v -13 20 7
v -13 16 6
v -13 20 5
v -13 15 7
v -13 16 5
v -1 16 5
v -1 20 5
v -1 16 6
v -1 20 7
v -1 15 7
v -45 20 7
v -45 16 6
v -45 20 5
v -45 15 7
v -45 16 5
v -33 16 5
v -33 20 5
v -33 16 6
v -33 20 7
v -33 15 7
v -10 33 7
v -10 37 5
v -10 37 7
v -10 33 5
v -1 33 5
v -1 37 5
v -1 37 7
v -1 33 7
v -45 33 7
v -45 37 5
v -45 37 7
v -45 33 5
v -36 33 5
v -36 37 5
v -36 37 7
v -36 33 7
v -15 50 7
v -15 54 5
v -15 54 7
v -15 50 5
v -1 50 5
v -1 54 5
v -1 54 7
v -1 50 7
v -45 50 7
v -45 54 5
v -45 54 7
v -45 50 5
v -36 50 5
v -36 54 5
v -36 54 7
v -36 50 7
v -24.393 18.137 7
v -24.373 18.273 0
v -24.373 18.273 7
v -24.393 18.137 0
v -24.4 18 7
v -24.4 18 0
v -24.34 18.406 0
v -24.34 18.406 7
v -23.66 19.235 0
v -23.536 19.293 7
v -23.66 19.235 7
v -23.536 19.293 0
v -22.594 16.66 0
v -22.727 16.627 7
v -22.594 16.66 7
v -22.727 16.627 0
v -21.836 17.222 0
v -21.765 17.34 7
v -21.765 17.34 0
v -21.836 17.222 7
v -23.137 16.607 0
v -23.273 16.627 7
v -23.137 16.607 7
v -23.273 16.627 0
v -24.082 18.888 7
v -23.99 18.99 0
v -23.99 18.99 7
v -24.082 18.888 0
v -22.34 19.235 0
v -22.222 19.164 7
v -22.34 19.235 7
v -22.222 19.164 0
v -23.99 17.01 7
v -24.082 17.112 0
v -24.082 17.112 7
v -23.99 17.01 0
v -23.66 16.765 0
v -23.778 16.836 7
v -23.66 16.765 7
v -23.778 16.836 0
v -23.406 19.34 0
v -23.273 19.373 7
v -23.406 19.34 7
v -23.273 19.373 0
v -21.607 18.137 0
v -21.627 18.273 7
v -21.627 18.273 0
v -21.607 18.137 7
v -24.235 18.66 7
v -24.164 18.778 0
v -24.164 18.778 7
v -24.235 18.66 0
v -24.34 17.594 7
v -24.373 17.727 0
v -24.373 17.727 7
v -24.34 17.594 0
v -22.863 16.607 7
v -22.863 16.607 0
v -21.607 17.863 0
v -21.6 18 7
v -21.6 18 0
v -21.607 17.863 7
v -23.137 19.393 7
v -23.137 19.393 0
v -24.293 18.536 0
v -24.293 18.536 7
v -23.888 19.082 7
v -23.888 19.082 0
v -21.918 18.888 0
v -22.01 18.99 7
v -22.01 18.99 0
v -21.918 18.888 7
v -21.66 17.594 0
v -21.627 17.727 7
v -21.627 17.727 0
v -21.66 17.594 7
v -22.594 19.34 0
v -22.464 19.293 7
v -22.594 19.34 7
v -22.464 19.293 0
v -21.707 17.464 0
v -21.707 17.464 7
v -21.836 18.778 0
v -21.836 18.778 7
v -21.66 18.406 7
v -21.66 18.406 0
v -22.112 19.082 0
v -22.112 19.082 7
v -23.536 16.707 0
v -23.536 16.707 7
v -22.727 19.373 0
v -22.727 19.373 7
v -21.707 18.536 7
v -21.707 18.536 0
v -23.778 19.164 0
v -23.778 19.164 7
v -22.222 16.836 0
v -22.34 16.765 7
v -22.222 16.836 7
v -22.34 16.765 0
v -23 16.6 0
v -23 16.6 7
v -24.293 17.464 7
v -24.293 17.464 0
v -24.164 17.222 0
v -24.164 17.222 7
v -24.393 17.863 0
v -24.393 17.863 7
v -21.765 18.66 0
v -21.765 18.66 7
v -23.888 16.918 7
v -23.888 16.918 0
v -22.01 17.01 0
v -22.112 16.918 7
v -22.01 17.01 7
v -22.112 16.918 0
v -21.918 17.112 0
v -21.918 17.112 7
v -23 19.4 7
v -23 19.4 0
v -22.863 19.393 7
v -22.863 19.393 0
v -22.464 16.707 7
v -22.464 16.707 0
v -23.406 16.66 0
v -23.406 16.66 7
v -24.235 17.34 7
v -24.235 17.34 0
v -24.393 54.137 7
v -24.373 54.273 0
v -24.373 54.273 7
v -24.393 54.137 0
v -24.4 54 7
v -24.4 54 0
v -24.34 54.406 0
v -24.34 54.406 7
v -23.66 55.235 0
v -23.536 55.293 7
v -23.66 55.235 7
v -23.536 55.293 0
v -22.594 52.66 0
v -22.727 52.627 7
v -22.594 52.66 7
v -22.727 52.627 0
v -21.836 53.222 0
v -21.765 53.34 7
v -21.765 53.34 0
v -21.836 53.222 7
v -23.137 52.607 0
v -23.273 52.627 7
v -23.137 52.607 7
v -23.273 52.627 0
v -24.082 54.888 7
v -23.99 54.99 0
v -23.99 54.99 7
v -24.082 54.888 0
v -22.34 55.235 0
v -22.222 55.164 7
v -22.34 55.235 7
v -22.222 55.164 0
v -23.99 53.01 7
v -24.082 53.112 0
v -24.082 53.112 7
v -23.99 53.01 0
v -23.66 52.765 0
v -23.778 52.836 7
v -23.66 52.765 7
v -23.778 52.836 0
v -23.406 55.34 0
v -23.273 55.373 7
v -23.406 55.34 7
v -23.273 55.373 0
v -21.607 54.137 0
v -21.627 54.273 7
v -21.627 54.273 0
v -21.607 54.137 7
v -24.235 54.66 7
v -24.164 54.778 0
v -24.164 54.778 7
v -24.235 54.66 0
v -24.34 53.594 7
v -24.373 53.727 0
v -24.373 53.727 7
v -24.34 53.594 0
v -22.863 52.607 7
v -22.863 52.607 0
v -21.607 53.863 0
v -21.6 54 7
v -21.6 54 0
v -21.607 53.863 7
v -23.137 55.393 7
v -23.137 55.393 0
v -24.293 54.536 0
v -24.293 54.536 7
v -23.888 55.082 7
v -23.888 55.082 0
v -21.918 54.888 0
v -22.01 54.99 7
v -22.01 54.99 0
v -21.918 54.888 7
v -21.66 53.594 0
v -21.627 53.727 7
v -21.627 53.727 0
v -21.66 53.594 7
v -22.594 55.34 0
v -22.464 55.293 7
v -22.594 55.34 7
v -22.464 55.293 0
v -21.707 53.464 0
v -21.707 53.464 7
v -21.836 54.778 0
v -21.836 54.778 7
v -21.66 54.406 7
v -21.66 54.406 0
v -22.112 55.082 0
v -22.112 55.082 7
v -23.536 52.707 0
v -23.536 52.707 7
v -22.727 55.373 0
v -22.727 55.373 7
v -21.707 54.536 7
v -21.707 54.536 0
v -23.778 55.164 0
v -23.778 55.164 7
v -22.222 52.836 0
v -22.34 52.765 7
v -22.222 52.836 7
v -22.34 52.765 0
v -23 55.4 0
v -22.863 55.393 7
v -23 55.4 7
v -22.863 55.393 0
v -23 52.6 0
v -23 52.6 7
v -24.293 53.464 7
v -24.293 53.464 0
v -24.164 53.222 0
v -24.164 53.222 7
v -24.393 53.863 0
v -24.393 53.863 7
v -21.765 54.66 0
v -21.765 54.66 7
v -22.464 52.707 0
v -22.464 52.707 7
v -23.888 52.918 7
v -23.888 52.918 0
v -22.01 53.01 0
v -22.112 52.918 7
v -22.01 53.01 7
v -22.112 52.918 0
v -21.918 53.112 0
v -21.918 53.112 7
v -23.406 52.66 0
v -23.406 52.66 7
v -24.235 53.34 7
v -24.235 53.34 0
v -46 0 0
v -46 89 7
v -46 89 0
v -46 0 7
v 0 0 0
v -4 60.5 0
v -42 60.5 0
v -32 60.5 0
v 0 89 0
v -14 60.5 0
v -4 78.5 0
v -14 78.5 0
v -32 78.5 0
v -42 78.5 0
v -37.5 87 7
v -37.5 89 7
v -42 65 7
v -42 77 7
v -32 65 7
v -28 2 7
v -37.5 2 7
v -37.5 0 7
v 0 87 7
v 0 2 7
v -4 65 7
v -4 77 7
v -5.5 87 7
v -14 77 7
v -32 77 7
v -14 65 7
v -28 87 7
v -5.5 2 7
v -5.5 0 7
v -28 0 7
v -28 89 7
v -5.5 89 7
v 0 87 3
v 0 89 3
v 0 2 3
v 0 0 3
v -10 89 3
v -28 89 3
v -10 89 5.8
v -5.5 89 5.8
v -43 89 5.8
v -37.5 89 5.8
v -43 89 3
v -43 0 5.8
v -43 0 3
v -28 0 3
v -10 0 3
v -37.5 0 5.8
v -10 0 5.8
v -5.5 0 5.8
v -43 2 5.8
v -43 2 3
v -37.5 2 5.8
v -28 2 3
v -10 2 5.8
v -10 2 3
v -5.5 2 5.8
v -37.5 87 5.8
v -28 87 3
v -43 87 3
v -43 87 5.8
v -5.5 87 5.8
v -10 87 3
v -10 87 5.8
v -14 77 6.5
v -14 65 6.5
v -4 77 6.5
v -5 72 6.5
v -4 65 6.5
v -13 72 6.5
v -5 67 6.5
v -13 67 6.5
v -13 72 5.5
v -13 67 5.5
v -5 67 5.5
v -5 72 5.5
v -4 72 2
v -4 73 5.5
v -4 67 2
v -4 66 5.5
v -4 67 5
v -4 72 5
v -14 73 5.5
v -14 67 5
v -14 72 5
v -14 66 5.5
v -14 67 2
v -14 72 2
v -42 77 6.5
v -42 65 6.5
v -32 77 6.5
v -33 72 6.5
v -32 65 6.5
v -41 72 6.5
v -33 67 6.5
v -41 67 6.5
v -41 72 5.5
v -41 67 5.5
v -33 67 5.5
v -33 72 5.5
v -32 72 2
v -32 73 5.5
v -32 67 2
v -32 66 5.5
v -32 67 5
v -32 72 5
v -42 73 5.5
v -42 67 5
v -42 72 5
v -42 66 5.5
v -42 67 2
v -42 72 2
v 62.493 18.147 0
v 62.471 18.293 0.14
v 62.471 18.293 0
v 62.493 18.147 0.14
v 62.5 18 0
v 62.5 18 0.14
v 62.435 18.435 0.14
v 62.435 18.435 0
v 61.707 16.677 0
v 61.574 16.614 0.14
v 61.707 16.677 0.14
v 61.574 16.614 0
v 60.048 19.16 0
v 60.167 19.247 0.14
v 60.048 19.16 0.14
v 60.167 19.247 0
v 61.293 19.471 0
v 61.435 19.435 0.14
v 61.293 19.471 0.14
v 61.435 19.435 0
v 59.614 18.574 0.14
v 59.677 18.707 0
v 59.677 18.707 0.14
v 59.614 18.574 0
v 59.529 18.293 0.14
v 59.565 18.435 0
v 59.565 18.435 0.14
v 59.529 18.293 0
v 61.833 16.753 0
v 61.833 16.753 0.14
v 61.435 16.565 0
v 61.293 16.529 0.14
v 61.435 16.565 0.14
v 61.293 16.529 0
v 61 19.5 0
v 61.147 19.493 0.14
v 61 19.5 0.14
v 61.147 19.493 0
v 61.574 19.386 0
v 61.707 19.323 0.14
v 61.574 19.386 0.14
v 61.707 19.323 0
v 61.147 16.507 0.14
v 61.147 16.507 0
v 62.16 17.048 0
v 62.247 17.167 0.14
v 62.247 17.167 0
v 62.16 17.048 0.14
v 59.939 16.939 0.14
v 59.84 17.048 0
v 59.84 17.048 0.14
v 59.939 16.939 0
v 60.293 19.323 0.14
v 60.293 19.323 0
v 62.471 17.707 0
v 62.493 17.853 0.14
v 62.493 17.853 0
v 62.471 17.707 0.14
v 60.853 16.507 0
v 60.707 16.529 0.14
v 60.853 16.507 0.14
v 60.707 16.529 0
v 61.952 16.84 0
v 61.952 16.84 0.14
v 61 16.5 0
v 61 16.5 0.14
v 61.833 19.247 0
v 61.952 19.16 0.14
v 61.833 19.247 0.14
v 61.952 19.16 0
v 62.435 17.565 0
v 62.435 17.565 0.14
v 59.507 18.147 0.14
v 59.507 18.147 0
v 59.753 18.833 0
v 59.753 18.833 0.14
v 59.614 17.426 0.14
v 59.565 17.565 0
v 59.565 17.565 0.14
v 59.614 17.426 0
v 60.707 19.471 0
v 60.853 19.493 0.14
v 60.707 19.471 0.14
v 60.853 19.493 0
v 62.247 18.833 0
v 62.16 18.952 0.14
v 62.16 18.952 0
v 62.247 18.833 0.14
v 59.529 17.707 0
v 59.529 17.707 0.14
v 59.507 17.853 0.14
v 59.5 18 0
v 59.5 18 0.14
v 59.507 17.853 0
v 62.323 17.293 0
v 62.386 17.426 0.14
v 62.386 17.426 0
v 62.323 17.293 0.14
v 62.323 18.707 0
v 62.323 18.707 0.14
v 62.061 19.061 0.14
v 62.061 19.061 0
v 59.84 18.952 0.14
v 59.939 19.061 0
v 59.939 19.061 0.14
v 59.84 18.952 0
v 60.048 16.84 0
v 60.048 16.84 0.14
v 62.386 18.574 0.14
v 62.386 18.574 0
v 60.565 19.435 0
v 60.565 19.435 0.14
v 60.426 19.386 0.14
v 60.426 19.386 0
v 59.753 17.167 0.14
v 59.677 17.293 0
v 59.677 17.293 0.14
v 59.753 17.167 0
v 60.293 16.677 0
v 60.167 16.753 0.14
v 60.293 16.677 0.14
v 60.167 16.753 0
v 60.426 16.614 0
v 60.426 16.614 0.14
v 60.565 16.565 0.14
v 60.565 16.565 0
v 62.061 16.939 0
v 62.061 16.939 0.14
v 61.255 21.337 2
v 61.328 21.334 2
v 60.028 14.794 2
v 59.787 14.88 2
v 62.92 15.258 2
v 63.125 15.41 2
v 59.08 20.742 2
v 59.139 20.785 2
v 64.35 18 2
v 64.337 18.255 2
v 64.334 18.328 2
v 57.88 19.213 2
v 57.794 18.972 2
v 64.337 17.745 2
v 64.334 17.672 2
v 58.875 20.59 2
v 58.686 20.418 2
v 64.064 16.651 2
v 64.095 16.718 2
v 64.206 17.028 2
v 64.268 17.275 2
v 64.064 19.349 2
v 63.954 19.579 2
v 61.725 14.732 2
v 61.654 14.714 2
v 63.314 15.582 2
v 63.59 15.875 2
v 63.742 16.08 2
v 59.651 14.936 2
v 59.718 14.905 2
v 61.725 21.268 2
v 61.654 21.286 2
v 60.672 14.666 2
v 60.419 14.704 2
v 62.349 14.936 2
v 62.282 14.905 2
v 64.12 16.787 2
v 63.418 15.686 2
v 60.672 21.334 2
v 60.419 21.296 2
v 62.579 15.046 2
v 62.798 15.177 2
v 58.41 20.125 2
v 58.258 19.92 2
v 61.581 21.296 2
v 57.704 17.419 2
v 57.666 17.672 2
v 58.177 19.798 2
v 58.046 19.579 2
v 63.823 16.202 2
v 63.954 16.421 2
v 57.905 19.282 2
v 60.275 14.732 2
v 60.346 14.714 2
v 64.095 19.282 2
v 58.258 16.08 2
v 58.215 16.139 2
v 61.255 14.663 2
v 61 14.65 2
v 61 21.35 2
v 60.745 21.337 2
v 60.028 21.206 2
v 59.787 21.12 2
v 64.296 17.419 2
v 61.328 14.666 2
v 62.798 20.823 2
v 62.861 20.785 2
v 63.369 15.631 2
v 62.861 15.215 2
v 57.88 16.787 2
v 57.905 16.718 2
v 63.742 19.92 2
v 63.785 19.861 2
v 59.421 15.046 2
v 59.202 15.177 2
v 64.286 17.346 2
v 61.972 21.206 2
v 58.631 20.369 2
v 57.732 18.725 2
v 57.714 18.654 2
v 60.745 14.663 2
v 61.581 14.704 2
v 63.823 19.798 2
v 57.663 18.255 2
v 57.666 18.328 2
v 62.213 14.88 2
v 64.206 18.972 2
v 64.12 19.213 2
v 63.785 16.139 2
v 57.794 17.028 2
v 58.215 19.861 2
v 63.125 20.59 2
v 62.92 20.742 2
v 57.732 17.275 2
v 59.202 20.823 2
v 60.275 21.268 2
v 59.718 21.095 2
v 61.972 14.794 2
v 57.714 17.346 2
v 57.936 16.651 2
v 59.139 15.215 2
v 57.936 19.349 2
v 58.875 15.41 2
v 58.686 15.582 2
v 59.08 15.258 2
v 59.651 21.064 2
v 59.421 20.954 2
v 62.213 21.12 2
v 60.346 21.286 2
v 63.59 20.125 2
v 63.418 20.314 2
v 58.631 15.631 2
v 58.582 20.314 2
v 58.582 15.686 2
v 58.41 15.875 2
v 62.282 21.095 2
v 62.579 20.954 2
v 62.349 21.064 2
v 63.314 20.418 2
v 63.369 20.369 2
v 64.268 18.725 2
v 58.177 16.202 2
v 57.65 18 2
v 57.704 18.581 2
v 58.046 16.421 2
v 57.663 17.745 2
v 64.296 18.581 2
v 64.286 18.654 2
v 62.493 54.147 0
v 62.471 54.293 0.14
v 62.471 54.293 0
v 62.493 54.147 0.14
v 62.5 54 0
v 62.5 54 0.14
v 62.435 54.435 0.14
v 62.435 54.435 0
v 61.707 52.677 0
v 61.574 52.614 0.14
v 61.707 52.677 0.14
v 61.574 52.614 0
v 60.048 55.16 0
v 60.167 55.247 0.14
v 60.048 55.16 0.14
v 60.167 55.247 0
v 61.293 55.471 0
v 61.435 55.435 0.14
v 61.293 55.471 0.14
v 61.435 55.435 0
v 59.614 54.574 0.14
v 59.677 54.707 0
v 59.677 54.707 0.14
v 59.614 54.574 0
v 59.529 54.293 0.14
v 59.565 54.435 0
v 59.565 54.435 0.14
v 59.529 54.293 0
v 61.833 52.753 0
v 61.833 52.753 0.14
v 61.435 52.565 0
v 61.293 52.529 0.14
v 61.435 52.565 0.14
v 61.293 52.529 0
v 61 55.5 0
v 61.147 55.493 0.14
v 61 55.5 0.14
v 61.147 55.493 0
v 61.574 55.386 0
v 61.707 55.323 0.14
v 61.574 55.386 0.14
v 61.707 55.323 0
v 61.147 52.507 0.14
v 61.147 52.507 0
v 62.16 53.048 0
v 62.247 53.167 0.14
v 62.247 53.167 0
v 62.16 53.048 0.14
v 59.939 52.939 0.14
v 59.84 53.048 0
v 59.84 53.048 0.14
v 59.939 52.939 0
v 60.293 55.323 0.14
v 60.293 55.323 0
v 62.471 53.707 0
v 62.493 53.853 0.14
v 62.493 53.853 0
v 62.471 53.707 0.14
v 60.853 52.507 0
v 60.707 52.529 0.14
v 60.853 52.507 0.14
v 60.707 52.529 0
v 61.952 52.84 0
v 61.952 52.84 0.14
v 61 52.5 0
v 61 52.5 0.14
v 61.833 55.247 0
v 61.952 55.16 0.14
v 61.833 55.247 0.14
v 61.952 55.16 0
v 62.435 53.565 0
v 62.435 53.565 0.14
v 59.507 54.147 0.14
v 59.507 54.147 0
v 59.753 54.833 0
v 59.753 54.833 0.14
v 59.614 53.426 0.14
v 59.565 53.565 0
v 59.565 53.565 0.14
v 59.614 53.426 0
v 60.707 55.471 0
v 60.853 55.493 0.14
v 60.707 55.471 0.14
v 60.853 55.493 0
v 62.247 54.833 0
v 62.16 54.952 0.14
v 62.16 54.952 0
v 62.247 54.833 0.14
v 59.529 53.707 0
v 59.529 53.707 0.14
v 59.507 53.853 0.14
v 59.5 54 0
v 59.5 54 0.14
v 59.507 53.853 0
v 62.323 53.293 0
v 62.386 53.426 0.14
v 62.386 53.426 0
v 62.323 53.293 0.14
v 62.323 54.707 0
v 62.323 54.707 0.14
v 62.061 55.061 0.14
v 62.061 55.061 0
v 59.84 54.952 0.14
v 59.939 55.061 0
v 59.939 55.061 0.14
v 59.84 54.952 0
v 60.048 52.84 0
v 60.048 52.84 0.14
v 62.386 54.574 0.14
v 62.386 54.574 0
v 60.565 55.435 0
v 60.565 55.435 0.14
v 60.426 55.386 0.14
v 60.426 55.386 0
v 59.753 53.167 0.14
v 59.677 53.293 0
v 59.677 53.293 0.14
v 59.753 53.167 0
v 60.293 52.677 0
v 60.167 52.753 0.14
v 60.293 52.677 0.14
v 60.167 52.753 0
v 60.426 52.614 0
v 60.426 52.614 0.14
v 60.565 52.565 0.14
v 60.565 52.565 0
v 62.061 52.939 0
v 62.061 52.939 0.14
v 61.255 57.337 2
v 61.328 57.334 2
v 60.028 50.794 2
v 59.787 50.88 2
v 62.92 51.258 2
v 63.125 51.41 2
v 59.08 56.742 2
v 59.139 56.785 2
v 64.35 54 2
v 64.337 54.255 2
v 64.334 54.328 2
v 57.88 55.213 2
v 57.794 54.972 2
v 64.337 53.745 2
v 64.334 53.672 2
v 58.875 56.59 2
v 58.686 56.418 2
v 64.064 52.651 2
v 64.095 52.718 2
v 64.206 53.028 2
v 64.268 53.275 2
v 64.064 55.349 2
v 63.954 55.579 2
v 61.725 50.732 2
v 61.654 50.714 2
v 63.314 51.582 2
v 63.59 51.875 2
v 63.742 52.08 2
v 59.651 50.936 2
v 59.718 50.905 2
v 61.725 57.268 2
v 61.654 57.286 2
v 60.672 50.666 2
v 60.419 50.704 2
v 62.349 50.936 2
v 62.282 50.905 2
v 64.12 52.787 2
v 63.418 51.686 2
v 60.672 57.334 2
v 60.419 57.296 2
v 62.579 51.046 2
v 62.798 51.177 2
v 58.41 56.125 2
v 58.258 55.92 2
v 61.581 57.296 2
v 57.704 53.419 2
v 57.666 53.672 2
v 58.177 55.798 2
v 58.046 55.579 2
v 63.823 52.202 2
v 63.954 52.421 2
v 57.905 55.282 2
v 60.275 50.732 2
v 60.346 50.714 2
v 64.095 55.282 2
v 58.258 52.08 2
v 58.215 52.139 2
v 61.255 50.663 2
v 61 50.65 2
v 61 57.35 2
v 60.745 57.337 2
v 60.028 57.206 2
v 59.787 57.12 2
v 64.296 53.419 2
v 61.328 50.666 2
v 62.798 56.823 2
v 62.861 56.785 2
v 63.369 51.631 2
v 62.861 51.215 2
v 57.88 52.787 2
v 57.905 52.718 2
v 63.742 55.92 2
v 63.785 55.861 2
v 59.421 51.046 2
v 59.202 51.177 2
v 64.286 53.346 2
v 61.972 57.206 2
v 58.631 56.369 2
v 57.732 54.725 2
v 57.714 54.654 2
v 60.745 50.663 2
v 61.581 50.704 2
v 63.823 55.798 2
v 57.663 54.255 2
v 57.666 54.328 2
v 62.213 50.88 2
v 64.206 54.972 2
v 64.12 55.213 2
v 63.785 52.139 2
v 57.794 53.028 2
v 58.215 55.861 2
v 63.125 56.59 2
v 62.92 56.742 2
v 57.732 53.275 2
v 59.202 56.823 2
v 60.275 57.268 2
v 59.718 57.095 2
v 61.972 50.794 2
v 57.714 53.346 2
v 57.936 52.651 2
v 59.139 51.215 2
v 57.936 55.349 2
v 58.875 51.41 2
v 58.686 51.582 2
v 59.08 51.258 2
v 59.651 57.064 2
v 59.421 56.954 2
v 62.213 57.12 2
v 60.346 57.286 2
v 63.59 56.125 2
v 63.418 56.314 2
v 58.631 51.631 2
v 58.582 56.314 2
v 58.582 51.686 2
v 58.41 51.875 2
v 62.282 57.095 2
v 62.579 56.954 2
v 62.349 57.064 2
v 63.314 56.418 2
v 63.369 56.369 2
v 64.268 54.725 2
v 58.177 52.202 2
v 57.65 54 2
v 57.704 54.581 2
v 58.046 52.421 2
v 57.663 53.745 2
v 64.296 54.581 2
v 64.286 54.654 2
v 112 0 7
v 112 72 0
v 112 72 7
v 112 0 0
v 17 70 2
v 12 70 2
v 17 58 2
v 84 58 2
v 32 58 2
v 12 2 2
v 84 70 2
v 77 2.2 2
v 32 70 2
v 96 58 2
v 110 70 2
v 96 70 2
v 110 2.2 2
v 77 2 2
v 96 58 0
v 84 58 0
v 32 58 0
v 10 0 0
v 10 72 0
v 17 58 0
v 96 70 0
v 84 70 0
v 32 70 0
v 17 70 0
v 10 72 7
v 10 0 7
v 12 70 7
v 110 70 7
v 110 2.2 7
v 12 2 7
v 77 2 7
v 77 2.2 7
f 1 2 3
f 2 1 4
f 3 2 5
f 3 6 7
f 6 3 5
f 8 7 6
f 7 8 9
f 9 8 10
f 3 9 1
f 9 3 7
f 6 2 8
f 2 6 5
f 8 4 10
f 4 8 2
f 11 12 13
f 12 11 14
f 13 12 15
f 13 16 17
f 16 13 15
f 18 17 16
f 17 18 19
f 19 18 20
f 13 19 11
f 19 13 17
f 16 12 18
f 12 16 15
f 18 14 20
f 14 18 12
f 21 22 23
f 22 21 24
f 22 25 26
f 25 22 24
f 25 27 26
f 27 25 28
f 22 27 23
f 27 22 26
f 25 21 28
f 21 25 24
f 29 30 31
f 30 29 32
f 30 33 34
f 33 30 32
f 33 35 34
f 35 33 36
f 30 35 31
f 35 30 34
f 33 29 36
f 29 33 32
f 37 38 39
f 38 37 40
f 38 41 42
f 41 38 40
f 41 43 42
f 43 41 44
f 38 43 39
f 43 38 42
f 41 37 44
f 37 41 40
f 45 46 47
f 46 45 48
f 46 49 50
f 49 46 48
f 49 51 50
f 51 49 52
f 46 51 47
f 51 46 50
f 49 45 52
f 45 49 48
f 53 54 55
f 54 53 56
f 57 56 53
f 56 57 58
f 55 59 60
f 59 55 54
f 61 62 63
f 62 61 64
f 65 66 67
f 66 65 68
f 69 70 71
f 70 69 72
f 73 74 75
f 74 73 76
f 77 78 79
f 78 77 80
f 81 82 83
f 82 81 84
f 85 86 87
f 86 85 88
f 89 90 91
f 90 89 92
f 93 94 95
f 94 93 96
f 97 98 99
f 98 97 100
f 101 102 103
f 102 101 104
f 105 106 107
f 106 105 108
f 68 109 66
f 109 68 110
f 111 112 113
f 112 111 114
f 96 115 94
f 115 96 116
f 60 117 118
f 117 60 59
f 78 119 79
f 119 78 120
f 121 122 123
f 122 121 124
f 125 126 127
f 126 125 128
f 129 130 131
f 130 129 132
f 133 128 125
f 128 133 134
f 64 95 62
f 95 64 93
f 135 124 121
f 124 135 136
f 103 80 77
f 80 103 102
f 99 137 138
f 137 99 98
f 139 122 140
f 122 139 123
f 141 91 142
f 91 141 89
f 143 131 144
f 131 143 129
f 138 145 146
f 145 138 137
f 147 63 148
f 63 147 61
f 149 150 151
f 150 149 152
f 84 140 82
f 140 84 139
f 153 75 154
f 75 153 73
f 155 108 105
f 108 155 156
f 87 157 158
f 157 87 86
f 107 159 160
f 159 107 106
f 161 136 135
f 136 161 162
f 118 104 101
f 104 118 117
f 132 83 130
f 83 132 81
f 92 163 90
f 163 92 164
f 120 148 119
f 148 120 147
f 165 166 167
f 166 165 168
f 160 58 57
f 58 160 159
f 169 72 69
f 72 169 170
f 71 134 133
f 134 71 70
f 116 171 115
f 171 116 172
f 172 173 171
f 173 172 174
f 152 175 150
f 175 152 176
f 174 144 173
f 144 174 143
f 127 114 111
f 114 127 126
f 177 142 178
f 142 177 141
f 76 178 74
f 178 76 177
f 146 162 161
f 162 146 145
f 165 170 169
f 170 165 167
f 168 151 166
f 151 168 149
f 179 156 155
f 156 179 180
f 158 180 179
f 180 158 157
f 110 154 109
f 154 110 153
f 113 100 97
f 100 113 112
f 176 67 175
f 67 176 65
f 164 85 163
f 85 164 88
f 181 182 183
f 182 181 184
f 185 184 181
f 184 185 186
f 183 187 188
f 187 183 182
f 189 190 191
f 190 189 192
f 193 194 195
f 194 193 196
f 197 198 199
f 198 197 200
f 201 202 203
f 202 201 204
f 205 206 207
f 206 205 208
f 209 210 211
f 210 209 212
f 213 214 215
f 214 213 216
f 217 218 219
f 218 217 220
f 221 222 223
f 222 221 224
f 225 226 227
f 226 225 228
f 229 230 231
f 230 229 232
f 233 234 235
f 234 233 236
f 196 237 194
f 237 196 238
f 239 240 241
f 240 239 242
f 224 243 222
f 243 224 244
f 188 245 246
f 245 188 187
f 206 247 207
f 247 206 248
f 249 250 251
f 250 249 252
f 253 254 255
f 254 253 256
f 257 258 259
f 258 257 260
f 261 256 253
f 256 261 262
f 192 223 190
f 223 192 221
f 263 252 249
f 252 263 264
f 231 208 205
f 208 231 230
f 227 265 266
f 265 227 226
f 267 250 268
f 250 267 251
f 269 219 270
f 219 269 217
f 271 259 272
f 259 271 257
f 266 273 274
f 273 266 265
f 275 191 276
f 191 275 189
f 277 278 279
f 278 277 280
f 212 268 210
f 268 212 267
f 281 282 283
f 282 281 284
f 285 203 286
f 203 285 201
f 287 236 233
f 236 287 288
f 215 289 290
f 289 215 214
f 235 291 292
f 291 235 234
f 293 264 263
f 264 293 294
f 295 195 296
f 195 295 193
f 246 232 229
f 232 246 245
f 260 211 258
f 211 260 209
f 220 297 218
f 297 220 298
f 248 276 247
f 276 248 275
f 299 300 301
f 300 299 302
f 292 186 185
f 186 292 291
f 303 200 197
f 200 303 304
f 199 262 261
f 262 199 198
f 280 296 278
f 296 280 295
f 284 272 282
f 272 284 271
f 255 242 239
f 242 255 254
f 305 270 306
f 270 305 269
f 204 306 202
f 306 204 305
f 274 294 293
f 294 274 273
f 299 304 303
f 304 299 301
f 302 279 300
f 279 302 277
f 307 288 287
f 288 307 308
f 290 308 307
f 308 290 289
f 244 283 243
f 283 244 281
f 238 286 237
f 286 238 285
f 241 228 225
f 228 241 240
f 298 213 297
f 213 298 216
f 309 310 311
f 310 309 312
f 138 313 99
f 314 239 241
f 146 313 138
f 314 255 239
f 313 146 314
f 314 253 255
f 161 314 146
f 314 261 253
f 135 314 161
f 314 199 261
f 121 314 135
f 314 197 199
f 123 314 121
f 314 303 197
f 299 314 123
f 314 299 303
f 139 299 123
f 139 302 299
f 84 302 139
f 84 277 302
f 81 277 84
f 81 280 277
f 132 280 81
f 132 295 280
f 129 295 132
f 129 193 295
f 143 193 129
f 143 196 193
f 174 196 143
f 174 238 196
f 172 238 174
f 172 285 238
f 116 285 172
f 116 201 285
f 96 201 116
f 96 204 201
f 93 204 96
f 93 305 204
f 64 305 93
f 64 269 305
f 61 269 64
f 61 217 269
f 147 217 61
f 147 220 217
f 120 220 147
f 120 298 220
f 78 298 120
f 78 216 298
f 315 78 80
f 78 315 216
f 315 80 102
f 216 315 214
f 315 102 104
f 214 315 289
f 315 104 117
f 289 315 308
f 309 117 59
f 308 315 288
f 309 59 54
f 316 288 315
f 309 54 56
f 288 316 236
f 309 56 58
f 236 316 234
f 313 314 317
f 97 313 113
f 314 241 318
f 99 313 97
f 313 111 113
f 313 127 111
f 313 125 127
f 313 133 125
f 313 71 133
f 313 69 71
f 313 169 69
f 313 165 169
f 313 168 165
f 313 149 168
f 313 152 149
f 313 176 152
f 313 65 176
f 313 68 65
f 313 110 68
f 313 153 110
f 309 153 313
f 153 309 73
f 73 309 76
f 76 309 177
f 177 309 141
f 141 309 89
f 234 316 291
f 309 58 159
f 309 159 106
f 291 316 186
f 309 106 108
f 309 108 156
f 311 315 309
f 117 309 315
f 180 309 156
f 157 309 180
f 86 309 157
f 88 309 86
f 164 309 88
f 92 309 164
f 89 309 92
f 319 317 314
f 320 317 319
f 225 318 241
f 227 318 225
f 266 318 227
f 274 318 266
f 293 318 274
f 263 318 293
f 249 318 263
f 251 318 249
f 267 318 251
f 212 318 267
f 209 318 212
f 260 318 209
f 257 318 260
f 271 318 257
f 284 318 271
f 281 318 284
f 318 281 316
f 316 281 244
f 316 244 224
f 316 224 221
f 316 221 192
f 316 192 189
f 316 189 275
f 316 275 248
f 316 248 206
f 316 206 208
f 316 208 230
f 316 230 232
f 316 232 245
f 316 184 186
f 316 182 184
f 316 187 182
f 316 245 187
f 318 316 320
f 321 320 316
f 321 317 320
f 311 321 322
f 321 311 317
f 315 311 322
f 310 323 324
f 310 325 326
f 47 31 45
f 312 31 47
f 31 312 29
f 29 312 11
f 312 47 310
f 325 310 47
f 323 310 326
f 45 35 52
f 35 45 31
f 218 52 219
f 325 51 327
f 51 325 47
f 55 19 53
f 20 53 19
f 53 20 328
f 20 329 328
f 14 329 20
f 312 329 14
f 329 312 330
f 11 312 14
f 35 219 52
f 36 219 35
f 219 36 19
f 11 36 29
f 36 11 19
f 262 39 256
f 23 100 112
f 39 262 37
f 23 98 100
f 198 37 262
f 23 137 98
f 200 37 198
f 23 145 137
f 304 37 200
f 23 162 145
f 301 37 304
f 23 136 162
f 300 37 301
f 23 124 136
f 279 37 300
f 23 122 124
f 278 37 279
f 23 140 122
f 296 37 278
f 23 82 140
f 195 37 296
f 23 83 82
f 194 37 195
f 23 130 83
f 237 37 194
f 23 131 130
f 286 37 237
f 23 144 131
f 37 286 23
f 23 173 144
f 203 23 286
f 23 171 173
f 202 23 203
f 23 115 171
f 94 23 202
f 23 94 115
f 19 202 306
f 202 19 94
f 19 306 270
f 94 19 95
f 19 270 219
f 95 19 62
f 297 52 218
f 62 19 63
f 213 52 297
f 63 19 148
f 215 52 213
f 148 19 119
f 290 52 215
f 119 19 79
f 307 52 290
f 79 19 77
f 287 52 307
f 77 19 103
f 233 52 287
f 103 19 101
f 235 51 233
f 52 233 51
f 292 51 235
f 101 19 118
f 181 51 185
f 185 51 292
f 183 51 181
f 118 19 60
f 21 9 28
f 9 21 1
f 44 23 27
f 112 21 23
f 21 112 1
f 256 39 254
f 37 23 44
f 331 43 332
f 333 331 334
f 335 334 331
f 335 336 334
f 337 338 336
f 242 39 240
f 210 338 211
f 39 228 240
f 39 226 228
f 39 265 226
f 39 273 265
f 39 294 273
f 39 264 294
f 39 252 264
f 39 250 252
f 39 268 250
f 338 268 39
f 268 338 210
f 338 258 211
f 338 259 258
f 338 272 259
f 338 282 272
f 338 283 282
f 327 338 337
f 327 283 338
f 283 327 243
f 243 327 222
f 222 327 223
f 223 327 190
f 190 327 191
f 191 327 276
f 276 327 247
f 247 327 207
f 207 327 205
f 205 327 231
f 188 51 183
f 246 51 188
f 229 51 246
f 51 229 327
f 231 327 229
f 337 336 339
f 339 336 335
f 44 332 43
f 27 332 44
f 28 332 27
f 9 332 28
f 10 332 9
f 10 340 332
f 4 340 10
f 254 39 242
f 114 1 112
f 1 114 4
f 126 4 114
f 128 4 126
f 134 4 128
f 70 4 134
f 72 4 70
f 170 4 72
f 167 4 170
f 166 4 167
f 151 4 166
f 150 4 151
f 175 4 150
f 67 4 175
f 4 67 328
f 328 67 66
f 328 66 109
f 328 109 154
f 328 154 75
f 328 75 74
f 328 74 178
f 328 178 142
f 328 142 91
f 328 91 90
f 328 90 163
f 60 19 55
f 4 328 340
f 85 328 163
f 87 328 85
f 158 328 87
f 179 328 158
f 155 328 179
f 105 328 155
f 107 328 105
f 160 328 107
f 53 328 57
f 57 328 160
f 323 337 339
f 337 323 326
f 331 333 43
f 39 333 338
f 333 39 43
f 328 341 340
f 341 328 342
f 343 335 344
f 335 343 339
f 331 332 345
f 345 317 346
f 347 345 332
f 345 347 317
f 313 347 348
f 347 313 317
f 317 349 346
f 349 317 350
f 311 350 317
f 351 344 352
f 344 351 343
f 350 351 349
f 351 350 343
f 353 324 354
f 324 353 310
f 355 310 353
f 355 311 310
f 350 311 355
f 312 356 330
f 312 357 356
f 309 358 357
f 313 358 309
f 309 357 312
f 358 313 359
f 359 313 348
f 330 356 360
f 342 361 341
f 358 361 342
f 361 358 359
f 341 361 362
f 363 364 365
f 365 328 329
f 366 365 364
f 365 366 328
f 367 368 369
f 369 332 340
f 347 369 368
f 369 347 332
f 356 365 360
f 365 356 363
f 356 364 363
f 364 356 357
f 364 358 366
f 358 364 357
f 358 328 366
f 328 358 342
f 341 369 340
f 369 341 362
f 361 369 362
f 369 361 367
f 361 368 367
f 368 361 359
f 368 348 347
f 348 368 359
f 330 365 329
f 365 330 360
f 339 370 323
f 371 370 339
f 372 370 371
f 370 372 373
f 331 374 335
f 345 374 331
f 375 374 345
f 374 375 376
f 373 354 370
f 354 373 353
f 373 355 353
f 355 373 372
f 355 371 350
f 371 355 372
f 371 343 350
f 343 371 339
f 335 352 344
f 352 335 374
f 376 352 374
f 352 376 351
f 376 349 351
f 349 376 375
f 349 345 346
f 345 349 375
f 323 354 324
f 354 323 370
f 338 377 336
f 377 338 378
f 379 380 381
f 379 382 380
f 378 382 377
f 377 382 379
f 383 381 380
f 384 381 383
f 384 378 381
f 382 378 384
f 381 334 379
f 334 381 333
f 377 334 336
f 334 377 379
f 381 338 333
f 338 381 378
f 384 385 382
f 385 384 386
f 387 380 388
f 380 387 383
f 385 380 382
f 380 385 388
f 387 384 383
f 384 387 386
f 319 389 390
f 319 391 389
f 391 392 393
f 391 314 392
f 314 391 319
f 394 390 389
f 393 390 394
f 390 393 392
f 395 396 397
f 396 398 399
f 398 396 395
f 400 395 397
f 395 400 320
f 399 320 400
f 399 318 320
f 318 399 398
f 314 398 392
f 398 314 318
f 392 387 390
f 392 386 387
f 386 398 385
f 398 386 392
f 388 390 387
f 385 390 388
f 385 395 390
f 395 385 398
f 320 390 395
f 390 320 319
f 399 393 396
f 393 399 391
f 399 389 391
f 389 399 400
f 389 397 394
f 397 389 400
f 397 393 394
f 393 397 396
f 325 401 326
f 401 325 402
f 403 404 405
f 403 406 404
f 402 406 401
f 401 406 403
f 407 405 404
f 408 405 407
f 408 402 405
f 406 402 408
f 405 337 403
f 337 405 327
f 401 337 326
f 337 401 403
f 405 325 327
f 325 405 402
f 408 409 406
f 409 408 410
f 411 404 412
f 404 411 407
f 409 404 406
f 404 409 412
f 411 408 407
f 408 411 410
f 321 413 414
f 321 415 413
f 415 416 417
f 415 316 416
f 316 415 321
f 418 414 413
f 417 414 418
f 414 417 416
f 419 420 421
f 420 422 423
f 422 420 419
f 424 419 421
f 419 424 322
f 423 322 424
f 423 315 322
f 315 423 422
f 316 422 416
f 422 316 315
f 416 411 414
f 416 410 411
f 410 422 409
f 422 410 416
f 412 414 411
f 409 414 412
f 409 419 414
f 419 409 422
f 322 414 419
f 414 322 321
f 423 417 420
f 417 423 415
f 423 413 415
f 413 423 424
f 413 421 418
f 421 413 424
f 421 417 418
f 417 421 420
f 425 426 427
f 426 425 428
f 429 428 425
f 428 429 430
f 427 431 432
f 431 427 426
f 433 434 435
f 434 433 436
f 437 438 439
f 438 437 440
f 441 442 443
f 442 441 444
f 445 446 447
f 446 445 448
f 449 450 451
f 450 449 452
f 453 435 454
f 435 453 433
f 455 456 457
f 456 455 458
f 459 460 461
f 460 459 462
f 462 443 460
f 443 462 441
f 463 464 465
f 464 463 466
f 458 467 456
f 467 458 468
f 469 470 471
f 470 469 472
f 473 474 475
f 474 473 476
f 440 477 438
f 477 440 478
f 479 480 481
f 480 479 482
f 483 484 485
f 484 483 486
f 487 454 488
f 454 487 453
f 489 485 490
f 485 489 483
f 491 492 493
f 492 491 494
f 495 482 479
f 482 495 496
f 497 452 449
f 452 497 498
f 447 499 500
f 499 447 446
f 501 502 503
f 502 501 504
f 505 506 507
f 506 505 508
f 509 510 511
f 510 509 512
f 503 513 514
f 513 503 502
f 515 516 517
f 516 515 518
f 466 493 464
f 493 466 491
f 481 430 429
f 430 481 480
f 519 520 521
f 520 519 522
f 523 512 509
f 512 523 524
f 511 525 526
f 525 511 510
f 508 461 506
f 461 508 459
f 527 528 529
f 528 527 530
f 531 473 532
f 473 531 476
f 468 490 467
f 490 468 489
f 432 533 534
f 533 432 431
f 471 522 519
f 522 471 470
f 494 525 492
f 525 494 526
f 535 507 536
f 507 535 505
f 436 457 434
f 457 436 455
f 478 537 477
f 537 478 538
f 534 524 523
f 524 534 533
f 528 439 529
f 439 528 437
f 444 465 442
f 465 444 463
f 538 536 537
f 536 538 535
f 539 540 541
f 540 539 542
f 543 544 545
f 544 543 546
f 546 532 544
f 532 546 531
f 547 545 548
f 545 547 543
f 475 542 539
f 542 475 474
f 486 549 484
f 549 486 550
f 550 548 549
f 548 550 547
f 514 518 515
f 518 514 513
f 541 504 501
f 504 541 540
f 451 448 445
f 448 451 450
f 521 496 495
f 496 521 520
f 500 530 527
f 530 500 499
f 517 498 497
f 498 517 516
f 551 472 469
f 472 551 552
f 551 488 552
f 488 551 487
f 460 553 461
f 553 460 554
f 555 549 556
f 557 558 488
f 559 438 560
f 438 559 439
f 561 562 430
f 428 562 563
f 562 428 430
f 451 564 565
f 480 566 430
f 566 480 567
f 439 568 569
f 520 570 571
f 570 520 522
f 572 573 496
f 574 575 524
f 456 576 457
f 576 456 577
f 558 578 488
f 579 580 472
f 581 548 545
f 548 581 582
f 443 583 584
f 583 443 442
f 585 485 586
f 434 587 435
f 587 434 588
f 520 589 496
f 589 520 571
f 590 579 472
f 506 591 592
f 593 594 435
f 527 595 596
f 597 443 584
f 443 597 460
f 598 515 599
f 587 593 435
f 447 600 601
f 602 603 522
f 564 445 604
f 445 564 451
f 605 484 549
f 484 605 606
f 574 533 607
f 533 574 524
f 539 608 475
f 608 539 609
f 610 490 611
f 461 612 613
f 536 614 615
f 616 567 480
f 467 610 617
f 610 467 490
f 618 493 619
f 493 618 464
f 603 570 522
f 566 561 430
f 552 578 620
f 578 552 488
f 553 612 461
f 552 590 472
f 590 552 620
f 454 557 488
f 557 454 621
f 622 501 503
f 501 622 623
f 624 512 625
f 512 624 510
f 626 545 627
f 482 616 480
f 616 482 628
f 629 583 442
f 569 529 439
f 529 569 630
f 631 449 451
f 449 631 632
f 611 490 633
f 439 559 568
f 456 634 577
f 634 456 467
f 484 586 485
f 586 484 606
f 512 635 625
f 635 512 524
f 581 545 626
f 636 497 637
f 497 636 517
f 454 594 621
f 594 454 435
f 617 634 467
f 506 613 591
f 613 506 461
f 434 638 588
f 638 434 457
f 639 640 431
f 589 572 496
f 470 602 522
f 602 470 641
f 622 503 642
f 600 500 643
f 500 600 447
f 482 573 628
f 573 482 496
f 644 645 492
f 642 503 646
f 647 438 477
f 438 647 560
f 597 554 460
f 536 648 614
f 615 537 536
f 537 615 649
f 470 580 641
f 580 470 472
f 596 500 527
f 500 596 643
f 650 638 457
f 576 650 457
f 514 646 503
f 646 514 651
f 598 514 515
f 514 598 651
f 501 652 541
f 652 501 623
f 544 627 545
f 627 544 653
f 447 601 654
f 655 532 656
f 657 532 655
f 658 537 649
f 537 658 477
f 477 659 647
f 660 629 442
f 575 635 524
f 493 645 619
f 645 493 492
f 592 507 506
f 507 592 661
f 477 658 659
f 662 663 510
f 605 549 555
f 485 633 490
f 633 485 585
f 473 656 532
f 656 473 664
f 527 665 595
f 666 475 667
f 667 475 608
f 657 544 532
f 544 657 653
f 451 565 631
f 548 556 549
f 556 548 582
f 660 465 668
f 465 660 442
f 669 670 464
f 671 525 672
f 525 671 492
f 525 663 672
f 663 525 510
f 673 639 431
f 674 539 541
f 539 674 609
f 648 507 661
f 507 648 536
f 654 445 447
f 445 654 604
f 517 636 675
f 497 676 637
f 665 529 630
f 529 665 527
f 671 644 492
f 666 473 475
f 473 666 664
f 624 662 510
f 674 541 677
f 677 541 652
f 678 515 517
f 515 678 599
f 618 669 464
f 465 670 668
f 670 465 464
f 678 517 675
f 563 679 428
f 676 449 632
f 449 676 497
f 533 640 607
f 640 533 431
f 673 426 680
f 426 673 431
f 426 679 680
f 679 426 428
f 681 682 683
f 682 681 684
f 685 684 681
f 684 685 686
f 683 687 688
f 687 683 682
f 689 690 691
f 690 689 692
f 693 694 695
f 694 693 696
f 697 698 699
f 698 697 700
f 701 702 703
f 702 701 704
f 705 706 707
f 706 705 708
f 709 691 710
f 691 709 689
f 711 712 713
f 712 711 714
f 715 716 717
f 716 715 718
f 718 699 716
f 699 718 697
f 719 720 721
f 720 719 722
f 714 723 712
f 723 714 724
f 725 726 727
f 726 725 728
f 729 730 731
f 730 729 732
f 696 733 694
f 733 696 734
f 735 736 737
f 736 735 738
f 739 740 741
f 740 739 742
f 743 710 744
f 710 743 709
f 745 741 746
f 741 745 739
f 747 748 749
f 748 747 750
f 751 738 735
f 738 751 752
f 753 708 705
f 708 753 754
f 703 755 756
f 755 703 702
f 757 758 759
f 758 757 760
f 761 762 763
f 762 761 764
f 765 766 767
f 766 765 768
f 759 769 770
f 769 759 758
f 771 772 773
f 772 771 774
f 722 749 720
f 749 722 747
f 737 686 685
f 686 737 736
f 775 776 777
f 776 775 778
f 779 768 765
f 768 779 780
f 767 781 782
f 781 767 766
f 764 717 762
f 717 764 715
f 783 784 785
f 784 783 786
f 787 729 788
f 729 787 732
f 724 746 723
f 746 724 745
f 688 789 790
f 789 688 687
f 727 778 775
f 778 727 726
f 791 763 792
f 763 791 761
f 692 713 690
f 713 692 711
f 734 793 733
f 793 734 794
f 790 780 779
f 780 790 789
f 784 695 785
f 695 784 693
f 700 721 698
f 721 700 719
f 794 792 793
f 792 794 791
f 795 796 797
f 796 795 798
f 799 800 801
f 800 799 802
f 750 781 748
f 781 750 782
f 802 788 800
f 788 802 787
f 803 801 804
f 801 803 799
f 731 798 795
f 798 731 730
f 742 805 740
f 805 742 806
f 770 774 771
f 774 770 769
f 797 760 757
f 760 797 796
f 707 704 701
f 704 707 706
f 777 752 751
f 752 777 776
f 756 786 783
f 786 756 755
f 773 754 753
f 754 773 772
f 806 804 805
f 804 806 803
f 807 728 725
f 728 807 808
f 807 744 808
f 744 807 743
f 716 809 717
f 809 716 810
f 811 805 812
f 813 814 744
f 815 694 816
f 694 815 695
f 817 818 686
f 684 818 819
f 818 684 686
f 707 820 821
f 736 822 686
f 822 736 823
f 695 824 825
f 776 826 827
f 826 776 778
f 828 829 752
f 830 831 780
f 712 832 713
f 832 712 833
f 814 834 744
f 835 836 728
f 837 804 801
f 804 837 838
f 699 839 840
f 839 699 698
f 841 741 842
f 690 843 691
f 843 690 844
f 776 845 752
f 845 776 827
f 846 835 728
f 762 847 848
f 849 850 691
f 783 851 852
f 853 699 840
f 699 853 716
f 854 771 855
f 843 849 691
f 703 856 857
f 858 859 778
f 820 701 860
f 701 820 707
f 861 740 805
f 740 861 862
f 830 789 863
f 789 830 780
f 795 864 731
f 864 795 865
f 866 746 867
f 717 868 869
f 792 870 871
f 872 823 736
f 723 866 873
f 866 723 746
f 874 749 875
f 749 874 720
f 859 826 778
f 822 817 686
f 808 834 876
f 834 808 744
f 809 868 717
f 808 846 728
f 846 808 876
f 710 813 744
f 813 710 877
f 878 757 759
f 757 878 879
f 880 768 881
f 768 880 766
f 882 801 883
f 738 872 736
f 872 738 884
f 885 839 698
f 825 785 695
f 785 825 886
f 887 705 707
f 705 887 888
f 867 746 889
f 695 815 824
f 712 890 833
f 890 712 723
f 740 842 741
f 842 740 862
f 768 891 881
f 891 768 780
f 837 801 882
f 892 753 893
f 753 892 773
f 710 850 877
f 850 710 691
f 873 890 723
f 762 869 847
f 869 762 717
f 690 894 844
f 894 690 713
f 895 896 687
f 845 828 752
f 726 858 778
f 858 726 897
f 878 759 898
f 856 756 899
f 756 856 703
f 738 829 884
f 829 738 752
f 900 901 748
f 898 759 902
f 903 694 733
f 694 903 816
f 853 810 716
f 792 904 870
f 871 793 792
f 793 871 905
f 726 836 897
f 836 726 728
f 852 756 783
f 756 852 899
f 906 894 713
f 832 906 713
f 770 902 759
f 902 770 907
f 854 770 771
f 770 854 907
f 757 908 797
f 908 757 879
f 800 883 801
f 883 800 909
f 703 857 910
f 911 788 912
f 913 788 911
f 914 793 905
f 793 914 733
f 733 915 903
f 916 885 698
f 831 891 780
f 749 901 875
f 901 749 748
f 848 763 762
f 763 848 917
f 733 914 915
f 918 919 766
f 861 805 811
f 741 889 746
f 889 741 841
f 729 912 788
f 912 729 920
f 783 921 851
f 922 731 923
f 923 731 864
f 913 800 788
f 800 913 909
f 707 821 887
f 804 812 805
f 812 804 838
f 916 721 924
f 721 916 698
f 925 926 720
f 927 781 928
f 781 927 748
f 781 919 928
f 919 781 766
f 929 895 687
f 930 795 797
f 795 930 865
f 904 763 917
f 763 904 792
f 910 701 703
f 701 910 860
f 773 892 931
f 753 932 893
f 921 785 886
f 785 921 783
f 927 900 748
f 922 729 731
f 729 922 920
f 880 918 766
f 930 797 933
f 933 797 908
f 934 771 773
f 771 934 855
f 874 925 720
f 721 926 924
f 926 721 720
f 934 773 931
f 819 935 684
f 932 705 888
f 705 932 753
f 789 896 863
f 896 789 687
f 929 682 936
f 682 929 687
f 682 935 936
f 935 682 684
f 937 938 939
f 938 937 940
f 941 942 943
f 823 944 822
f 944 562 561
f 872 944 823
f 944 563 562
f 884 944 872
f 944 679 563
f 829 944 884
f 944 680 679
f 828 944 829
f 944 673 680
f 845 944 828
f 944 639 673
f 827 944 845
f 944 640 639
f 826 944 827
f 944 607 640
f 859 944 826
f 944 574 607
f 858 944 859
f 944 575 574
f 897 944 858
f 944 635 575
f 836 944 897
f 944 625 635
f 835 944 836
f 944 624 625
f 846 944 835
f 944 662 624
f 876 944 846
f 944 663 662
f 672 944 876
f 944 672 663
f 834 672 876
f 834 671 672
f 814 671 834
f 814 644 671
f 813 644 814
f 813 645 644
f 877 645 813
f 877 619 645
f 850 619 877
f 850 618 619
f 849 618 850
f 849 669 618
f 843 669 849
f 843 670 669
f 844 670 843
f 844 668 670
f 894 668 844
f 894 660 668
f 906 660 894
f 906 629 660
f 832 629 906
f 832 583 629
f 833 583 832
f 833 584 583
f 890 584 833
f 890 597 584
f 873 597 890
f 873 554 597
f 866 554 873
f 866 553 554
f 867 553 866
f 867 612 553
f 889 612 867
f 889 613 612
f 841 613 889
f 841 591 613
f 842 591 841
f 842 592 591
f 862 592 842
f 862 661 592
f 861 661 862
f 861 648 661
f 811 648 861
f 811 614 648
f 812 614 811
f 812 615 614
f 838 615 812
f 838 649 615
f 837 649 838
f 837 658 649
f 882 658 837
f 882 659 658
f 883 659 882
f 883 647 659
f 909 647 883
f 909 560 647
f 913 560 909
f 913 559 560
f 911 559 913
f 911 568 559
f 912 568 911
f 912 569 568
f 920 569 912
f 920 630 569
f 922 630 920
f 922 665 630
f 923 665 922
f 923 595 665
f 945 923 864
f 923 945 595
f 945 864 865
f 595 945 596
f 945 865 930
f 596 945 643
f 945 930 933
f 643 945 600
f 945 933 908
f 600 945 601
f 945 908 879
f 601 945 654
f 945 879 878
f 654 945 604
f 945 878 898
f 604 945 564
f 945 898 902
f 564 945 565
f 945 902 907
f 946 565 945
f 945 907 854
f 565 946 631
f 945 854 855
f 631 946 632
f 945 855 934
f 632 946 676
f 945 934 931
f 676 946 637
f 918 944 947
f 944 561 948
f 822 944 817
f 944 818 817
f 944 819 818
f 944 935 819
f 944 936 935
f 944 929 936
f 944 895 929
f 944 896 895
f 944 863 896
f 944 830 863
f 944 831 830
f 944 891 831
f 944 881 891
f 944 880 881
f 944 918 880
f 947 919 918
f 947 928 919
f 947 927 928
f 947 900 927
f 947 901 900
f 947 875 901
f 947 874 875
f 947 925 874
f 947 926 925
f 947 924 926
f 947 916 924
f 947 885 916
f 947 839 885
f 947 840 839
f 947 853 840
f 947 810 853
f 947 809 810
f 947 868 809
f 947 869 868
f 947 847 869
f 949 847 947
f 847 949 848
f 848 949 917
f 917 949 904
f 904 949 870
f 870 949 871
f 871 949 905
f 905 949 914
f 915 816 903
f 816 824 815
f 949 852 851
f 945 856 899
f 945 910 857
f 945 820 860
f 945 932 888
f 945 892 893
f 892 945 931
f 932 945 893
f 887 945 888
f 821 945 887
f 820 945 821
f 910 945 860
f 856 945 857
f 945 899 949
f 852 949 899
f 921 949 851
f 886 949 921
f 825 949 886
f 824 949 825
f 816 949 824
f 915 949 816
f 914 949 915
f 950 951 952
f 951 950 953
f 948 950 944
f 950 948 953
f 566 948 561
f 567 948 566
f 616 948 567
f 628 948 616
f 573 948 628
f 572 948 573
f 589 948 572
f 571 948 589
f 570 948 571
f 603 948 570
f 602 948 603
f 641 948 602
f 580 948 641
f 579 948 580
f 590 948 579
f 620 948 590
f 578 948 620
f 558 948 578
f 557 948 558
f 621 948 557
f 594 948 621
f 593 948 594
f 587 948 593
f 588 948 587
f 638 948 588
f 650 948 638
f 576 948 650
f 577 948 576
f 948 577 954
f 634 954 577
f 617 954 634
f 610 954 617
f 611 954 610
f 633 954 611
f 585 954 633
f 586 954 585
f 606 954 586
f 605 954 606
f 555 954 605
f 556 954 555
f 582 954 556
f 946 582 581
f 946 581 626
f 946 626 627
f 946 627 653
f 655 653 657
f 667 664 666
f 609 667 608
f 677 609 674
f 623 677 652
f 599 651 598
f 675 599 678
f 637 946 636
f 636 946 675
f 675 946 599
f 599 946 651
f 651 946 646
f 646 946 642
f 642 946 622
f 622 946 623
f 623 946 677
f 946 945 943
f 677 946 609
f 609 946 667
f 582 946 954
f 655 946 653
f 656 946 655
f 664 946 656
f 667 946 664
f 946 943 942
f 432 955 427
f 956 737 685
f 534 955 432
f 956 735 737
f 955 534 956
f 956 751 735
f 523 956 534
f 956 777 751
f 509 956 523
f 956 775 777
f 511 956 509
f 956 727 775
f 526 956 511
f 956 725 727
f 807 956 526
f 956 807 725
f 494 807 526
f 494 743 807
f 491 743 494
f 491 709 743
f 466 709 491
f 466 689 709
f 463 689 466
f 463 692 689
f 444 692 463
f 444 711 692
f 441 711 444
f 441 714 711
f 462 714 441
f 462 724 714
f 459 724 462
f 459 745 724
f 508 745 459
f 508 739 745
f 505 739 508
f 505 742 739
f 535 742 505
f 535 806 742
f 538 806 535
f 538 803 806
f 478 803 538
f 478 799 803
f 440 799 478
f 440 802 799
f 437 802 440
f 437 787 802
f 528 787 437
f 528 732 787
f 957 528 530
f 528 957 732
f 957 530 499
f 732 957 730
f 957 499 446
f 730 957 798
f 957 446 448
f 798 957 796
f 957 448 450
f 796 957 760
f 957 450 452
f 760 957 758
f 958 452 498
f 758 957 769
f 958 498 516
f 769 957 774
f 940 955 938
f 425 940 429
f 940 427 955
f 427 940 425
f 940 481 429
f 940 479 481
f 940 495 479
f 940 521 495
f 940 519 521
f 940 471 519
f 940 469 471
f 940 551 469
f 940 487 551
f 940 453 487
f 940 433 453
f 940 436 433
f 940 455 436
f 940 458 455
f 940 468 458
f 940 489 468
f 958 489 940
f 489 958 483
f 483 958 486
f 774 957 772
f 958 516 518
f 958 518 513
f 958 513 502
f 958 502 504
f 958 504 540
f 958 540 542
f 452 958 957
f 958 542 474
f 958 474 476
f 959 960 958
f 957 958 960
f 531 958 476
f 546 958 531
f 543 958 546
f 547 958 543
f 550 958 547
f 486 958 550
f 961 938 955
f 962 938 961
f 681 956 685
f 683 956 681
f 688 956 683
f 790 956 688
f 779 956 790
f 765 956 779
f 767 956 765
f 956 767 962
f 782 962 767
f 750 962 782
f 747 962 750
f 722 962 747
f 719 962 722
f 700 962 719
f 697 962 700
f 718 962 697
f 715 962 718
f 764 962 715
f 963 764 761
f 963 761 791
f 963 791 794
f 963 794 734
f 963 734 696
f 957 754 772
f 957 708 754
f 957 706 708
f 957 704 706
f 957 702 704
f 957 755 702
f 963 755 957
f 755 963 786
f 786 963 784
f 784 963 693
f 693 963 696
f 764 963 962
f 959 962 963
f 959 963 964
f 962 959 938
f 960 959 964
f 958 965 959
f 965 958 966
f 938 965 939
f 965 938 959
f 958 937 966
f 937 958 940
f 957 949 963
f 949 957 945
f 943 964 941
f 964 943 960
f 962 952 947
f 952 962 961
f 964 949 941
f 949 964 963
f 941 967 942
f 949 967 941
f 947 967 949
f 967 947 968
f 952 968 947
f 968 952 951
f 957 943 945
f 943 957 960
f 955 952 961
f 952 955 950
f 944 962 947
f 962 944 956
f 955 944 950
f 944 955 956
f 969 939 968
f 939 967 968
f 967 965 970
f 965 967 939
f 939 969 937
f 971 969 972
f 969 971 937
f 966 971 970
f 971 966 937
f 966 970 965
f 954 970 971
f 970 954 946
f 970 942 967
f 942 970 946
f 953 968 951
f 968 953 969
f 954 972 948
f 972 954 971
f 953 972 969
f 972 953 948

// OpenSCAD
/* concerns:

2AA top filler harmful?

2.9-3mm screw holes

*/

module SocketHook(y) {
    // traced shape
    translate([0, y + 3, 0]) rotate([90, 0, 0]) linear_extrude(3)
    polygon([[-1, 4], [10, 4], [10, 1.2], [5.5, 1.2], [5.5, 0], [28, 0], [28, 4], [43, 4], [43, 1.2], [37.5, 1.2], [37.5, -1], [-1, -1]], convexity = 10);
}
module SocketRegistration(y, l, r, t) {
    for (x = [[1, l], [45 - r, r]]) {
        translate([x.x, y, -1]) {
            cube([x.y, 4, 3]);
            if (t) {
                multmatrix([
                    [1, 0, 0, 0],
                    [0, 1, 0, -1.5],
                    [0, 1, 1, -2.5],
                ]) cube([x.y, 2, 3]);
            }
        }
    }
}

module Screws(d) {
    screw_pos = [[23, 18, 0], [23, 54, 0]];
    for (pos = screw_pos) {
        translate(pos) {
            $fn = 64;
            translate([0, 0, -1]) cylinder(h = 11, d = d);
            translate([0, 0, 9 - 1.86]) cylinder(h = 1.86 * 2, d1 = 3, d2 = 3 + 3.7 * 2);
        }
    }
}

module Socket() {
    difference() {
        cube([46, 89, 7]);
        SocketHook(-1);
        SocketHook(87);
        SocketRegistration(16, 12, 12, true);
        SocketRegistration(33, 9, 9, false);
        SocketRegistration(50, 14, 9, false);
        Screws(2.8);
    }
}

module Holder() {
    difference() {
        // base
        cube([102, 72, 2]);
        // switch cutouts - slanted
//        translate([0, 70, 0]) rotate([90, 0, 0]) linear_extrude(10)
//        polygon([[4, -2], [4, -1], [8, 3], [14, 3], [18, -1], [74, -1], [74, 3], [81, 3], [85, -1], [85, -2]]);
        // switch cutouts - cubic
        translate([7, 58, -1]) cube([15, 12, 4]);
        translate([74, 58, -1]) cube([12, 12, 4]);
        translate([28, 0, -7]) Screws(3);
    }
    // rims
    cube([102, 2, 7]);
    translate([0, 70, 0]) cube([102, 2, 7]);
    cube([2, 72, 7]);
    translate([100, 0, 0]) cube([2, 72, 7]);
    // rim for smaller battery
    translate([67, 0, 0]) cube([35, 2.2, 7]);
}

module Contact(x) {
    translate([x, 65, 0]) {
        // outer cutout
        translate([0, 0, -1]) cube([10, 12, 1.5]);
        // contact hold
        translate([1, 2, -1]) cube([8, 5, 2.6]);
        // upper carving / holding ring
        rotate([90, 0, 90]) linear_extrude(10)
        polygon(points = [
            [-7, 9.5], [1, 1.5], [8, 1.5], [13.5, 7], [13.5, 9], [5, 9],
            [2, 5], [7, 5], [7, 2], [2, 2],
        ], paths = [[0, 1, 2, 3, 4, 5], [6, 7, 8, 9]]);
    }
}

stack = false;

translate(stack ? [0, 0, 0] : [0, 0, 7]) rotate(stack ? [0, 0, 0] : [0, 180, 0])
color([0, 0, 1]) difference() {
    // base shapes + additions
    Socket();
    Contact(4);
    Contact(32);
}
translate(stack ? [-28, 0, 7] : [10, 0, 0]) 
color([0, 1, 0]) Holder();

//color([1, 0, 0, 0.5])
//union() {
//    // 2AA reference
//    translate([65 - 26, 12, 9]) cube([33, 67, 18]);
//    // 4AA reference
//    translate([-26, 11, 9]) cube([65, 68, 19]);
//}
